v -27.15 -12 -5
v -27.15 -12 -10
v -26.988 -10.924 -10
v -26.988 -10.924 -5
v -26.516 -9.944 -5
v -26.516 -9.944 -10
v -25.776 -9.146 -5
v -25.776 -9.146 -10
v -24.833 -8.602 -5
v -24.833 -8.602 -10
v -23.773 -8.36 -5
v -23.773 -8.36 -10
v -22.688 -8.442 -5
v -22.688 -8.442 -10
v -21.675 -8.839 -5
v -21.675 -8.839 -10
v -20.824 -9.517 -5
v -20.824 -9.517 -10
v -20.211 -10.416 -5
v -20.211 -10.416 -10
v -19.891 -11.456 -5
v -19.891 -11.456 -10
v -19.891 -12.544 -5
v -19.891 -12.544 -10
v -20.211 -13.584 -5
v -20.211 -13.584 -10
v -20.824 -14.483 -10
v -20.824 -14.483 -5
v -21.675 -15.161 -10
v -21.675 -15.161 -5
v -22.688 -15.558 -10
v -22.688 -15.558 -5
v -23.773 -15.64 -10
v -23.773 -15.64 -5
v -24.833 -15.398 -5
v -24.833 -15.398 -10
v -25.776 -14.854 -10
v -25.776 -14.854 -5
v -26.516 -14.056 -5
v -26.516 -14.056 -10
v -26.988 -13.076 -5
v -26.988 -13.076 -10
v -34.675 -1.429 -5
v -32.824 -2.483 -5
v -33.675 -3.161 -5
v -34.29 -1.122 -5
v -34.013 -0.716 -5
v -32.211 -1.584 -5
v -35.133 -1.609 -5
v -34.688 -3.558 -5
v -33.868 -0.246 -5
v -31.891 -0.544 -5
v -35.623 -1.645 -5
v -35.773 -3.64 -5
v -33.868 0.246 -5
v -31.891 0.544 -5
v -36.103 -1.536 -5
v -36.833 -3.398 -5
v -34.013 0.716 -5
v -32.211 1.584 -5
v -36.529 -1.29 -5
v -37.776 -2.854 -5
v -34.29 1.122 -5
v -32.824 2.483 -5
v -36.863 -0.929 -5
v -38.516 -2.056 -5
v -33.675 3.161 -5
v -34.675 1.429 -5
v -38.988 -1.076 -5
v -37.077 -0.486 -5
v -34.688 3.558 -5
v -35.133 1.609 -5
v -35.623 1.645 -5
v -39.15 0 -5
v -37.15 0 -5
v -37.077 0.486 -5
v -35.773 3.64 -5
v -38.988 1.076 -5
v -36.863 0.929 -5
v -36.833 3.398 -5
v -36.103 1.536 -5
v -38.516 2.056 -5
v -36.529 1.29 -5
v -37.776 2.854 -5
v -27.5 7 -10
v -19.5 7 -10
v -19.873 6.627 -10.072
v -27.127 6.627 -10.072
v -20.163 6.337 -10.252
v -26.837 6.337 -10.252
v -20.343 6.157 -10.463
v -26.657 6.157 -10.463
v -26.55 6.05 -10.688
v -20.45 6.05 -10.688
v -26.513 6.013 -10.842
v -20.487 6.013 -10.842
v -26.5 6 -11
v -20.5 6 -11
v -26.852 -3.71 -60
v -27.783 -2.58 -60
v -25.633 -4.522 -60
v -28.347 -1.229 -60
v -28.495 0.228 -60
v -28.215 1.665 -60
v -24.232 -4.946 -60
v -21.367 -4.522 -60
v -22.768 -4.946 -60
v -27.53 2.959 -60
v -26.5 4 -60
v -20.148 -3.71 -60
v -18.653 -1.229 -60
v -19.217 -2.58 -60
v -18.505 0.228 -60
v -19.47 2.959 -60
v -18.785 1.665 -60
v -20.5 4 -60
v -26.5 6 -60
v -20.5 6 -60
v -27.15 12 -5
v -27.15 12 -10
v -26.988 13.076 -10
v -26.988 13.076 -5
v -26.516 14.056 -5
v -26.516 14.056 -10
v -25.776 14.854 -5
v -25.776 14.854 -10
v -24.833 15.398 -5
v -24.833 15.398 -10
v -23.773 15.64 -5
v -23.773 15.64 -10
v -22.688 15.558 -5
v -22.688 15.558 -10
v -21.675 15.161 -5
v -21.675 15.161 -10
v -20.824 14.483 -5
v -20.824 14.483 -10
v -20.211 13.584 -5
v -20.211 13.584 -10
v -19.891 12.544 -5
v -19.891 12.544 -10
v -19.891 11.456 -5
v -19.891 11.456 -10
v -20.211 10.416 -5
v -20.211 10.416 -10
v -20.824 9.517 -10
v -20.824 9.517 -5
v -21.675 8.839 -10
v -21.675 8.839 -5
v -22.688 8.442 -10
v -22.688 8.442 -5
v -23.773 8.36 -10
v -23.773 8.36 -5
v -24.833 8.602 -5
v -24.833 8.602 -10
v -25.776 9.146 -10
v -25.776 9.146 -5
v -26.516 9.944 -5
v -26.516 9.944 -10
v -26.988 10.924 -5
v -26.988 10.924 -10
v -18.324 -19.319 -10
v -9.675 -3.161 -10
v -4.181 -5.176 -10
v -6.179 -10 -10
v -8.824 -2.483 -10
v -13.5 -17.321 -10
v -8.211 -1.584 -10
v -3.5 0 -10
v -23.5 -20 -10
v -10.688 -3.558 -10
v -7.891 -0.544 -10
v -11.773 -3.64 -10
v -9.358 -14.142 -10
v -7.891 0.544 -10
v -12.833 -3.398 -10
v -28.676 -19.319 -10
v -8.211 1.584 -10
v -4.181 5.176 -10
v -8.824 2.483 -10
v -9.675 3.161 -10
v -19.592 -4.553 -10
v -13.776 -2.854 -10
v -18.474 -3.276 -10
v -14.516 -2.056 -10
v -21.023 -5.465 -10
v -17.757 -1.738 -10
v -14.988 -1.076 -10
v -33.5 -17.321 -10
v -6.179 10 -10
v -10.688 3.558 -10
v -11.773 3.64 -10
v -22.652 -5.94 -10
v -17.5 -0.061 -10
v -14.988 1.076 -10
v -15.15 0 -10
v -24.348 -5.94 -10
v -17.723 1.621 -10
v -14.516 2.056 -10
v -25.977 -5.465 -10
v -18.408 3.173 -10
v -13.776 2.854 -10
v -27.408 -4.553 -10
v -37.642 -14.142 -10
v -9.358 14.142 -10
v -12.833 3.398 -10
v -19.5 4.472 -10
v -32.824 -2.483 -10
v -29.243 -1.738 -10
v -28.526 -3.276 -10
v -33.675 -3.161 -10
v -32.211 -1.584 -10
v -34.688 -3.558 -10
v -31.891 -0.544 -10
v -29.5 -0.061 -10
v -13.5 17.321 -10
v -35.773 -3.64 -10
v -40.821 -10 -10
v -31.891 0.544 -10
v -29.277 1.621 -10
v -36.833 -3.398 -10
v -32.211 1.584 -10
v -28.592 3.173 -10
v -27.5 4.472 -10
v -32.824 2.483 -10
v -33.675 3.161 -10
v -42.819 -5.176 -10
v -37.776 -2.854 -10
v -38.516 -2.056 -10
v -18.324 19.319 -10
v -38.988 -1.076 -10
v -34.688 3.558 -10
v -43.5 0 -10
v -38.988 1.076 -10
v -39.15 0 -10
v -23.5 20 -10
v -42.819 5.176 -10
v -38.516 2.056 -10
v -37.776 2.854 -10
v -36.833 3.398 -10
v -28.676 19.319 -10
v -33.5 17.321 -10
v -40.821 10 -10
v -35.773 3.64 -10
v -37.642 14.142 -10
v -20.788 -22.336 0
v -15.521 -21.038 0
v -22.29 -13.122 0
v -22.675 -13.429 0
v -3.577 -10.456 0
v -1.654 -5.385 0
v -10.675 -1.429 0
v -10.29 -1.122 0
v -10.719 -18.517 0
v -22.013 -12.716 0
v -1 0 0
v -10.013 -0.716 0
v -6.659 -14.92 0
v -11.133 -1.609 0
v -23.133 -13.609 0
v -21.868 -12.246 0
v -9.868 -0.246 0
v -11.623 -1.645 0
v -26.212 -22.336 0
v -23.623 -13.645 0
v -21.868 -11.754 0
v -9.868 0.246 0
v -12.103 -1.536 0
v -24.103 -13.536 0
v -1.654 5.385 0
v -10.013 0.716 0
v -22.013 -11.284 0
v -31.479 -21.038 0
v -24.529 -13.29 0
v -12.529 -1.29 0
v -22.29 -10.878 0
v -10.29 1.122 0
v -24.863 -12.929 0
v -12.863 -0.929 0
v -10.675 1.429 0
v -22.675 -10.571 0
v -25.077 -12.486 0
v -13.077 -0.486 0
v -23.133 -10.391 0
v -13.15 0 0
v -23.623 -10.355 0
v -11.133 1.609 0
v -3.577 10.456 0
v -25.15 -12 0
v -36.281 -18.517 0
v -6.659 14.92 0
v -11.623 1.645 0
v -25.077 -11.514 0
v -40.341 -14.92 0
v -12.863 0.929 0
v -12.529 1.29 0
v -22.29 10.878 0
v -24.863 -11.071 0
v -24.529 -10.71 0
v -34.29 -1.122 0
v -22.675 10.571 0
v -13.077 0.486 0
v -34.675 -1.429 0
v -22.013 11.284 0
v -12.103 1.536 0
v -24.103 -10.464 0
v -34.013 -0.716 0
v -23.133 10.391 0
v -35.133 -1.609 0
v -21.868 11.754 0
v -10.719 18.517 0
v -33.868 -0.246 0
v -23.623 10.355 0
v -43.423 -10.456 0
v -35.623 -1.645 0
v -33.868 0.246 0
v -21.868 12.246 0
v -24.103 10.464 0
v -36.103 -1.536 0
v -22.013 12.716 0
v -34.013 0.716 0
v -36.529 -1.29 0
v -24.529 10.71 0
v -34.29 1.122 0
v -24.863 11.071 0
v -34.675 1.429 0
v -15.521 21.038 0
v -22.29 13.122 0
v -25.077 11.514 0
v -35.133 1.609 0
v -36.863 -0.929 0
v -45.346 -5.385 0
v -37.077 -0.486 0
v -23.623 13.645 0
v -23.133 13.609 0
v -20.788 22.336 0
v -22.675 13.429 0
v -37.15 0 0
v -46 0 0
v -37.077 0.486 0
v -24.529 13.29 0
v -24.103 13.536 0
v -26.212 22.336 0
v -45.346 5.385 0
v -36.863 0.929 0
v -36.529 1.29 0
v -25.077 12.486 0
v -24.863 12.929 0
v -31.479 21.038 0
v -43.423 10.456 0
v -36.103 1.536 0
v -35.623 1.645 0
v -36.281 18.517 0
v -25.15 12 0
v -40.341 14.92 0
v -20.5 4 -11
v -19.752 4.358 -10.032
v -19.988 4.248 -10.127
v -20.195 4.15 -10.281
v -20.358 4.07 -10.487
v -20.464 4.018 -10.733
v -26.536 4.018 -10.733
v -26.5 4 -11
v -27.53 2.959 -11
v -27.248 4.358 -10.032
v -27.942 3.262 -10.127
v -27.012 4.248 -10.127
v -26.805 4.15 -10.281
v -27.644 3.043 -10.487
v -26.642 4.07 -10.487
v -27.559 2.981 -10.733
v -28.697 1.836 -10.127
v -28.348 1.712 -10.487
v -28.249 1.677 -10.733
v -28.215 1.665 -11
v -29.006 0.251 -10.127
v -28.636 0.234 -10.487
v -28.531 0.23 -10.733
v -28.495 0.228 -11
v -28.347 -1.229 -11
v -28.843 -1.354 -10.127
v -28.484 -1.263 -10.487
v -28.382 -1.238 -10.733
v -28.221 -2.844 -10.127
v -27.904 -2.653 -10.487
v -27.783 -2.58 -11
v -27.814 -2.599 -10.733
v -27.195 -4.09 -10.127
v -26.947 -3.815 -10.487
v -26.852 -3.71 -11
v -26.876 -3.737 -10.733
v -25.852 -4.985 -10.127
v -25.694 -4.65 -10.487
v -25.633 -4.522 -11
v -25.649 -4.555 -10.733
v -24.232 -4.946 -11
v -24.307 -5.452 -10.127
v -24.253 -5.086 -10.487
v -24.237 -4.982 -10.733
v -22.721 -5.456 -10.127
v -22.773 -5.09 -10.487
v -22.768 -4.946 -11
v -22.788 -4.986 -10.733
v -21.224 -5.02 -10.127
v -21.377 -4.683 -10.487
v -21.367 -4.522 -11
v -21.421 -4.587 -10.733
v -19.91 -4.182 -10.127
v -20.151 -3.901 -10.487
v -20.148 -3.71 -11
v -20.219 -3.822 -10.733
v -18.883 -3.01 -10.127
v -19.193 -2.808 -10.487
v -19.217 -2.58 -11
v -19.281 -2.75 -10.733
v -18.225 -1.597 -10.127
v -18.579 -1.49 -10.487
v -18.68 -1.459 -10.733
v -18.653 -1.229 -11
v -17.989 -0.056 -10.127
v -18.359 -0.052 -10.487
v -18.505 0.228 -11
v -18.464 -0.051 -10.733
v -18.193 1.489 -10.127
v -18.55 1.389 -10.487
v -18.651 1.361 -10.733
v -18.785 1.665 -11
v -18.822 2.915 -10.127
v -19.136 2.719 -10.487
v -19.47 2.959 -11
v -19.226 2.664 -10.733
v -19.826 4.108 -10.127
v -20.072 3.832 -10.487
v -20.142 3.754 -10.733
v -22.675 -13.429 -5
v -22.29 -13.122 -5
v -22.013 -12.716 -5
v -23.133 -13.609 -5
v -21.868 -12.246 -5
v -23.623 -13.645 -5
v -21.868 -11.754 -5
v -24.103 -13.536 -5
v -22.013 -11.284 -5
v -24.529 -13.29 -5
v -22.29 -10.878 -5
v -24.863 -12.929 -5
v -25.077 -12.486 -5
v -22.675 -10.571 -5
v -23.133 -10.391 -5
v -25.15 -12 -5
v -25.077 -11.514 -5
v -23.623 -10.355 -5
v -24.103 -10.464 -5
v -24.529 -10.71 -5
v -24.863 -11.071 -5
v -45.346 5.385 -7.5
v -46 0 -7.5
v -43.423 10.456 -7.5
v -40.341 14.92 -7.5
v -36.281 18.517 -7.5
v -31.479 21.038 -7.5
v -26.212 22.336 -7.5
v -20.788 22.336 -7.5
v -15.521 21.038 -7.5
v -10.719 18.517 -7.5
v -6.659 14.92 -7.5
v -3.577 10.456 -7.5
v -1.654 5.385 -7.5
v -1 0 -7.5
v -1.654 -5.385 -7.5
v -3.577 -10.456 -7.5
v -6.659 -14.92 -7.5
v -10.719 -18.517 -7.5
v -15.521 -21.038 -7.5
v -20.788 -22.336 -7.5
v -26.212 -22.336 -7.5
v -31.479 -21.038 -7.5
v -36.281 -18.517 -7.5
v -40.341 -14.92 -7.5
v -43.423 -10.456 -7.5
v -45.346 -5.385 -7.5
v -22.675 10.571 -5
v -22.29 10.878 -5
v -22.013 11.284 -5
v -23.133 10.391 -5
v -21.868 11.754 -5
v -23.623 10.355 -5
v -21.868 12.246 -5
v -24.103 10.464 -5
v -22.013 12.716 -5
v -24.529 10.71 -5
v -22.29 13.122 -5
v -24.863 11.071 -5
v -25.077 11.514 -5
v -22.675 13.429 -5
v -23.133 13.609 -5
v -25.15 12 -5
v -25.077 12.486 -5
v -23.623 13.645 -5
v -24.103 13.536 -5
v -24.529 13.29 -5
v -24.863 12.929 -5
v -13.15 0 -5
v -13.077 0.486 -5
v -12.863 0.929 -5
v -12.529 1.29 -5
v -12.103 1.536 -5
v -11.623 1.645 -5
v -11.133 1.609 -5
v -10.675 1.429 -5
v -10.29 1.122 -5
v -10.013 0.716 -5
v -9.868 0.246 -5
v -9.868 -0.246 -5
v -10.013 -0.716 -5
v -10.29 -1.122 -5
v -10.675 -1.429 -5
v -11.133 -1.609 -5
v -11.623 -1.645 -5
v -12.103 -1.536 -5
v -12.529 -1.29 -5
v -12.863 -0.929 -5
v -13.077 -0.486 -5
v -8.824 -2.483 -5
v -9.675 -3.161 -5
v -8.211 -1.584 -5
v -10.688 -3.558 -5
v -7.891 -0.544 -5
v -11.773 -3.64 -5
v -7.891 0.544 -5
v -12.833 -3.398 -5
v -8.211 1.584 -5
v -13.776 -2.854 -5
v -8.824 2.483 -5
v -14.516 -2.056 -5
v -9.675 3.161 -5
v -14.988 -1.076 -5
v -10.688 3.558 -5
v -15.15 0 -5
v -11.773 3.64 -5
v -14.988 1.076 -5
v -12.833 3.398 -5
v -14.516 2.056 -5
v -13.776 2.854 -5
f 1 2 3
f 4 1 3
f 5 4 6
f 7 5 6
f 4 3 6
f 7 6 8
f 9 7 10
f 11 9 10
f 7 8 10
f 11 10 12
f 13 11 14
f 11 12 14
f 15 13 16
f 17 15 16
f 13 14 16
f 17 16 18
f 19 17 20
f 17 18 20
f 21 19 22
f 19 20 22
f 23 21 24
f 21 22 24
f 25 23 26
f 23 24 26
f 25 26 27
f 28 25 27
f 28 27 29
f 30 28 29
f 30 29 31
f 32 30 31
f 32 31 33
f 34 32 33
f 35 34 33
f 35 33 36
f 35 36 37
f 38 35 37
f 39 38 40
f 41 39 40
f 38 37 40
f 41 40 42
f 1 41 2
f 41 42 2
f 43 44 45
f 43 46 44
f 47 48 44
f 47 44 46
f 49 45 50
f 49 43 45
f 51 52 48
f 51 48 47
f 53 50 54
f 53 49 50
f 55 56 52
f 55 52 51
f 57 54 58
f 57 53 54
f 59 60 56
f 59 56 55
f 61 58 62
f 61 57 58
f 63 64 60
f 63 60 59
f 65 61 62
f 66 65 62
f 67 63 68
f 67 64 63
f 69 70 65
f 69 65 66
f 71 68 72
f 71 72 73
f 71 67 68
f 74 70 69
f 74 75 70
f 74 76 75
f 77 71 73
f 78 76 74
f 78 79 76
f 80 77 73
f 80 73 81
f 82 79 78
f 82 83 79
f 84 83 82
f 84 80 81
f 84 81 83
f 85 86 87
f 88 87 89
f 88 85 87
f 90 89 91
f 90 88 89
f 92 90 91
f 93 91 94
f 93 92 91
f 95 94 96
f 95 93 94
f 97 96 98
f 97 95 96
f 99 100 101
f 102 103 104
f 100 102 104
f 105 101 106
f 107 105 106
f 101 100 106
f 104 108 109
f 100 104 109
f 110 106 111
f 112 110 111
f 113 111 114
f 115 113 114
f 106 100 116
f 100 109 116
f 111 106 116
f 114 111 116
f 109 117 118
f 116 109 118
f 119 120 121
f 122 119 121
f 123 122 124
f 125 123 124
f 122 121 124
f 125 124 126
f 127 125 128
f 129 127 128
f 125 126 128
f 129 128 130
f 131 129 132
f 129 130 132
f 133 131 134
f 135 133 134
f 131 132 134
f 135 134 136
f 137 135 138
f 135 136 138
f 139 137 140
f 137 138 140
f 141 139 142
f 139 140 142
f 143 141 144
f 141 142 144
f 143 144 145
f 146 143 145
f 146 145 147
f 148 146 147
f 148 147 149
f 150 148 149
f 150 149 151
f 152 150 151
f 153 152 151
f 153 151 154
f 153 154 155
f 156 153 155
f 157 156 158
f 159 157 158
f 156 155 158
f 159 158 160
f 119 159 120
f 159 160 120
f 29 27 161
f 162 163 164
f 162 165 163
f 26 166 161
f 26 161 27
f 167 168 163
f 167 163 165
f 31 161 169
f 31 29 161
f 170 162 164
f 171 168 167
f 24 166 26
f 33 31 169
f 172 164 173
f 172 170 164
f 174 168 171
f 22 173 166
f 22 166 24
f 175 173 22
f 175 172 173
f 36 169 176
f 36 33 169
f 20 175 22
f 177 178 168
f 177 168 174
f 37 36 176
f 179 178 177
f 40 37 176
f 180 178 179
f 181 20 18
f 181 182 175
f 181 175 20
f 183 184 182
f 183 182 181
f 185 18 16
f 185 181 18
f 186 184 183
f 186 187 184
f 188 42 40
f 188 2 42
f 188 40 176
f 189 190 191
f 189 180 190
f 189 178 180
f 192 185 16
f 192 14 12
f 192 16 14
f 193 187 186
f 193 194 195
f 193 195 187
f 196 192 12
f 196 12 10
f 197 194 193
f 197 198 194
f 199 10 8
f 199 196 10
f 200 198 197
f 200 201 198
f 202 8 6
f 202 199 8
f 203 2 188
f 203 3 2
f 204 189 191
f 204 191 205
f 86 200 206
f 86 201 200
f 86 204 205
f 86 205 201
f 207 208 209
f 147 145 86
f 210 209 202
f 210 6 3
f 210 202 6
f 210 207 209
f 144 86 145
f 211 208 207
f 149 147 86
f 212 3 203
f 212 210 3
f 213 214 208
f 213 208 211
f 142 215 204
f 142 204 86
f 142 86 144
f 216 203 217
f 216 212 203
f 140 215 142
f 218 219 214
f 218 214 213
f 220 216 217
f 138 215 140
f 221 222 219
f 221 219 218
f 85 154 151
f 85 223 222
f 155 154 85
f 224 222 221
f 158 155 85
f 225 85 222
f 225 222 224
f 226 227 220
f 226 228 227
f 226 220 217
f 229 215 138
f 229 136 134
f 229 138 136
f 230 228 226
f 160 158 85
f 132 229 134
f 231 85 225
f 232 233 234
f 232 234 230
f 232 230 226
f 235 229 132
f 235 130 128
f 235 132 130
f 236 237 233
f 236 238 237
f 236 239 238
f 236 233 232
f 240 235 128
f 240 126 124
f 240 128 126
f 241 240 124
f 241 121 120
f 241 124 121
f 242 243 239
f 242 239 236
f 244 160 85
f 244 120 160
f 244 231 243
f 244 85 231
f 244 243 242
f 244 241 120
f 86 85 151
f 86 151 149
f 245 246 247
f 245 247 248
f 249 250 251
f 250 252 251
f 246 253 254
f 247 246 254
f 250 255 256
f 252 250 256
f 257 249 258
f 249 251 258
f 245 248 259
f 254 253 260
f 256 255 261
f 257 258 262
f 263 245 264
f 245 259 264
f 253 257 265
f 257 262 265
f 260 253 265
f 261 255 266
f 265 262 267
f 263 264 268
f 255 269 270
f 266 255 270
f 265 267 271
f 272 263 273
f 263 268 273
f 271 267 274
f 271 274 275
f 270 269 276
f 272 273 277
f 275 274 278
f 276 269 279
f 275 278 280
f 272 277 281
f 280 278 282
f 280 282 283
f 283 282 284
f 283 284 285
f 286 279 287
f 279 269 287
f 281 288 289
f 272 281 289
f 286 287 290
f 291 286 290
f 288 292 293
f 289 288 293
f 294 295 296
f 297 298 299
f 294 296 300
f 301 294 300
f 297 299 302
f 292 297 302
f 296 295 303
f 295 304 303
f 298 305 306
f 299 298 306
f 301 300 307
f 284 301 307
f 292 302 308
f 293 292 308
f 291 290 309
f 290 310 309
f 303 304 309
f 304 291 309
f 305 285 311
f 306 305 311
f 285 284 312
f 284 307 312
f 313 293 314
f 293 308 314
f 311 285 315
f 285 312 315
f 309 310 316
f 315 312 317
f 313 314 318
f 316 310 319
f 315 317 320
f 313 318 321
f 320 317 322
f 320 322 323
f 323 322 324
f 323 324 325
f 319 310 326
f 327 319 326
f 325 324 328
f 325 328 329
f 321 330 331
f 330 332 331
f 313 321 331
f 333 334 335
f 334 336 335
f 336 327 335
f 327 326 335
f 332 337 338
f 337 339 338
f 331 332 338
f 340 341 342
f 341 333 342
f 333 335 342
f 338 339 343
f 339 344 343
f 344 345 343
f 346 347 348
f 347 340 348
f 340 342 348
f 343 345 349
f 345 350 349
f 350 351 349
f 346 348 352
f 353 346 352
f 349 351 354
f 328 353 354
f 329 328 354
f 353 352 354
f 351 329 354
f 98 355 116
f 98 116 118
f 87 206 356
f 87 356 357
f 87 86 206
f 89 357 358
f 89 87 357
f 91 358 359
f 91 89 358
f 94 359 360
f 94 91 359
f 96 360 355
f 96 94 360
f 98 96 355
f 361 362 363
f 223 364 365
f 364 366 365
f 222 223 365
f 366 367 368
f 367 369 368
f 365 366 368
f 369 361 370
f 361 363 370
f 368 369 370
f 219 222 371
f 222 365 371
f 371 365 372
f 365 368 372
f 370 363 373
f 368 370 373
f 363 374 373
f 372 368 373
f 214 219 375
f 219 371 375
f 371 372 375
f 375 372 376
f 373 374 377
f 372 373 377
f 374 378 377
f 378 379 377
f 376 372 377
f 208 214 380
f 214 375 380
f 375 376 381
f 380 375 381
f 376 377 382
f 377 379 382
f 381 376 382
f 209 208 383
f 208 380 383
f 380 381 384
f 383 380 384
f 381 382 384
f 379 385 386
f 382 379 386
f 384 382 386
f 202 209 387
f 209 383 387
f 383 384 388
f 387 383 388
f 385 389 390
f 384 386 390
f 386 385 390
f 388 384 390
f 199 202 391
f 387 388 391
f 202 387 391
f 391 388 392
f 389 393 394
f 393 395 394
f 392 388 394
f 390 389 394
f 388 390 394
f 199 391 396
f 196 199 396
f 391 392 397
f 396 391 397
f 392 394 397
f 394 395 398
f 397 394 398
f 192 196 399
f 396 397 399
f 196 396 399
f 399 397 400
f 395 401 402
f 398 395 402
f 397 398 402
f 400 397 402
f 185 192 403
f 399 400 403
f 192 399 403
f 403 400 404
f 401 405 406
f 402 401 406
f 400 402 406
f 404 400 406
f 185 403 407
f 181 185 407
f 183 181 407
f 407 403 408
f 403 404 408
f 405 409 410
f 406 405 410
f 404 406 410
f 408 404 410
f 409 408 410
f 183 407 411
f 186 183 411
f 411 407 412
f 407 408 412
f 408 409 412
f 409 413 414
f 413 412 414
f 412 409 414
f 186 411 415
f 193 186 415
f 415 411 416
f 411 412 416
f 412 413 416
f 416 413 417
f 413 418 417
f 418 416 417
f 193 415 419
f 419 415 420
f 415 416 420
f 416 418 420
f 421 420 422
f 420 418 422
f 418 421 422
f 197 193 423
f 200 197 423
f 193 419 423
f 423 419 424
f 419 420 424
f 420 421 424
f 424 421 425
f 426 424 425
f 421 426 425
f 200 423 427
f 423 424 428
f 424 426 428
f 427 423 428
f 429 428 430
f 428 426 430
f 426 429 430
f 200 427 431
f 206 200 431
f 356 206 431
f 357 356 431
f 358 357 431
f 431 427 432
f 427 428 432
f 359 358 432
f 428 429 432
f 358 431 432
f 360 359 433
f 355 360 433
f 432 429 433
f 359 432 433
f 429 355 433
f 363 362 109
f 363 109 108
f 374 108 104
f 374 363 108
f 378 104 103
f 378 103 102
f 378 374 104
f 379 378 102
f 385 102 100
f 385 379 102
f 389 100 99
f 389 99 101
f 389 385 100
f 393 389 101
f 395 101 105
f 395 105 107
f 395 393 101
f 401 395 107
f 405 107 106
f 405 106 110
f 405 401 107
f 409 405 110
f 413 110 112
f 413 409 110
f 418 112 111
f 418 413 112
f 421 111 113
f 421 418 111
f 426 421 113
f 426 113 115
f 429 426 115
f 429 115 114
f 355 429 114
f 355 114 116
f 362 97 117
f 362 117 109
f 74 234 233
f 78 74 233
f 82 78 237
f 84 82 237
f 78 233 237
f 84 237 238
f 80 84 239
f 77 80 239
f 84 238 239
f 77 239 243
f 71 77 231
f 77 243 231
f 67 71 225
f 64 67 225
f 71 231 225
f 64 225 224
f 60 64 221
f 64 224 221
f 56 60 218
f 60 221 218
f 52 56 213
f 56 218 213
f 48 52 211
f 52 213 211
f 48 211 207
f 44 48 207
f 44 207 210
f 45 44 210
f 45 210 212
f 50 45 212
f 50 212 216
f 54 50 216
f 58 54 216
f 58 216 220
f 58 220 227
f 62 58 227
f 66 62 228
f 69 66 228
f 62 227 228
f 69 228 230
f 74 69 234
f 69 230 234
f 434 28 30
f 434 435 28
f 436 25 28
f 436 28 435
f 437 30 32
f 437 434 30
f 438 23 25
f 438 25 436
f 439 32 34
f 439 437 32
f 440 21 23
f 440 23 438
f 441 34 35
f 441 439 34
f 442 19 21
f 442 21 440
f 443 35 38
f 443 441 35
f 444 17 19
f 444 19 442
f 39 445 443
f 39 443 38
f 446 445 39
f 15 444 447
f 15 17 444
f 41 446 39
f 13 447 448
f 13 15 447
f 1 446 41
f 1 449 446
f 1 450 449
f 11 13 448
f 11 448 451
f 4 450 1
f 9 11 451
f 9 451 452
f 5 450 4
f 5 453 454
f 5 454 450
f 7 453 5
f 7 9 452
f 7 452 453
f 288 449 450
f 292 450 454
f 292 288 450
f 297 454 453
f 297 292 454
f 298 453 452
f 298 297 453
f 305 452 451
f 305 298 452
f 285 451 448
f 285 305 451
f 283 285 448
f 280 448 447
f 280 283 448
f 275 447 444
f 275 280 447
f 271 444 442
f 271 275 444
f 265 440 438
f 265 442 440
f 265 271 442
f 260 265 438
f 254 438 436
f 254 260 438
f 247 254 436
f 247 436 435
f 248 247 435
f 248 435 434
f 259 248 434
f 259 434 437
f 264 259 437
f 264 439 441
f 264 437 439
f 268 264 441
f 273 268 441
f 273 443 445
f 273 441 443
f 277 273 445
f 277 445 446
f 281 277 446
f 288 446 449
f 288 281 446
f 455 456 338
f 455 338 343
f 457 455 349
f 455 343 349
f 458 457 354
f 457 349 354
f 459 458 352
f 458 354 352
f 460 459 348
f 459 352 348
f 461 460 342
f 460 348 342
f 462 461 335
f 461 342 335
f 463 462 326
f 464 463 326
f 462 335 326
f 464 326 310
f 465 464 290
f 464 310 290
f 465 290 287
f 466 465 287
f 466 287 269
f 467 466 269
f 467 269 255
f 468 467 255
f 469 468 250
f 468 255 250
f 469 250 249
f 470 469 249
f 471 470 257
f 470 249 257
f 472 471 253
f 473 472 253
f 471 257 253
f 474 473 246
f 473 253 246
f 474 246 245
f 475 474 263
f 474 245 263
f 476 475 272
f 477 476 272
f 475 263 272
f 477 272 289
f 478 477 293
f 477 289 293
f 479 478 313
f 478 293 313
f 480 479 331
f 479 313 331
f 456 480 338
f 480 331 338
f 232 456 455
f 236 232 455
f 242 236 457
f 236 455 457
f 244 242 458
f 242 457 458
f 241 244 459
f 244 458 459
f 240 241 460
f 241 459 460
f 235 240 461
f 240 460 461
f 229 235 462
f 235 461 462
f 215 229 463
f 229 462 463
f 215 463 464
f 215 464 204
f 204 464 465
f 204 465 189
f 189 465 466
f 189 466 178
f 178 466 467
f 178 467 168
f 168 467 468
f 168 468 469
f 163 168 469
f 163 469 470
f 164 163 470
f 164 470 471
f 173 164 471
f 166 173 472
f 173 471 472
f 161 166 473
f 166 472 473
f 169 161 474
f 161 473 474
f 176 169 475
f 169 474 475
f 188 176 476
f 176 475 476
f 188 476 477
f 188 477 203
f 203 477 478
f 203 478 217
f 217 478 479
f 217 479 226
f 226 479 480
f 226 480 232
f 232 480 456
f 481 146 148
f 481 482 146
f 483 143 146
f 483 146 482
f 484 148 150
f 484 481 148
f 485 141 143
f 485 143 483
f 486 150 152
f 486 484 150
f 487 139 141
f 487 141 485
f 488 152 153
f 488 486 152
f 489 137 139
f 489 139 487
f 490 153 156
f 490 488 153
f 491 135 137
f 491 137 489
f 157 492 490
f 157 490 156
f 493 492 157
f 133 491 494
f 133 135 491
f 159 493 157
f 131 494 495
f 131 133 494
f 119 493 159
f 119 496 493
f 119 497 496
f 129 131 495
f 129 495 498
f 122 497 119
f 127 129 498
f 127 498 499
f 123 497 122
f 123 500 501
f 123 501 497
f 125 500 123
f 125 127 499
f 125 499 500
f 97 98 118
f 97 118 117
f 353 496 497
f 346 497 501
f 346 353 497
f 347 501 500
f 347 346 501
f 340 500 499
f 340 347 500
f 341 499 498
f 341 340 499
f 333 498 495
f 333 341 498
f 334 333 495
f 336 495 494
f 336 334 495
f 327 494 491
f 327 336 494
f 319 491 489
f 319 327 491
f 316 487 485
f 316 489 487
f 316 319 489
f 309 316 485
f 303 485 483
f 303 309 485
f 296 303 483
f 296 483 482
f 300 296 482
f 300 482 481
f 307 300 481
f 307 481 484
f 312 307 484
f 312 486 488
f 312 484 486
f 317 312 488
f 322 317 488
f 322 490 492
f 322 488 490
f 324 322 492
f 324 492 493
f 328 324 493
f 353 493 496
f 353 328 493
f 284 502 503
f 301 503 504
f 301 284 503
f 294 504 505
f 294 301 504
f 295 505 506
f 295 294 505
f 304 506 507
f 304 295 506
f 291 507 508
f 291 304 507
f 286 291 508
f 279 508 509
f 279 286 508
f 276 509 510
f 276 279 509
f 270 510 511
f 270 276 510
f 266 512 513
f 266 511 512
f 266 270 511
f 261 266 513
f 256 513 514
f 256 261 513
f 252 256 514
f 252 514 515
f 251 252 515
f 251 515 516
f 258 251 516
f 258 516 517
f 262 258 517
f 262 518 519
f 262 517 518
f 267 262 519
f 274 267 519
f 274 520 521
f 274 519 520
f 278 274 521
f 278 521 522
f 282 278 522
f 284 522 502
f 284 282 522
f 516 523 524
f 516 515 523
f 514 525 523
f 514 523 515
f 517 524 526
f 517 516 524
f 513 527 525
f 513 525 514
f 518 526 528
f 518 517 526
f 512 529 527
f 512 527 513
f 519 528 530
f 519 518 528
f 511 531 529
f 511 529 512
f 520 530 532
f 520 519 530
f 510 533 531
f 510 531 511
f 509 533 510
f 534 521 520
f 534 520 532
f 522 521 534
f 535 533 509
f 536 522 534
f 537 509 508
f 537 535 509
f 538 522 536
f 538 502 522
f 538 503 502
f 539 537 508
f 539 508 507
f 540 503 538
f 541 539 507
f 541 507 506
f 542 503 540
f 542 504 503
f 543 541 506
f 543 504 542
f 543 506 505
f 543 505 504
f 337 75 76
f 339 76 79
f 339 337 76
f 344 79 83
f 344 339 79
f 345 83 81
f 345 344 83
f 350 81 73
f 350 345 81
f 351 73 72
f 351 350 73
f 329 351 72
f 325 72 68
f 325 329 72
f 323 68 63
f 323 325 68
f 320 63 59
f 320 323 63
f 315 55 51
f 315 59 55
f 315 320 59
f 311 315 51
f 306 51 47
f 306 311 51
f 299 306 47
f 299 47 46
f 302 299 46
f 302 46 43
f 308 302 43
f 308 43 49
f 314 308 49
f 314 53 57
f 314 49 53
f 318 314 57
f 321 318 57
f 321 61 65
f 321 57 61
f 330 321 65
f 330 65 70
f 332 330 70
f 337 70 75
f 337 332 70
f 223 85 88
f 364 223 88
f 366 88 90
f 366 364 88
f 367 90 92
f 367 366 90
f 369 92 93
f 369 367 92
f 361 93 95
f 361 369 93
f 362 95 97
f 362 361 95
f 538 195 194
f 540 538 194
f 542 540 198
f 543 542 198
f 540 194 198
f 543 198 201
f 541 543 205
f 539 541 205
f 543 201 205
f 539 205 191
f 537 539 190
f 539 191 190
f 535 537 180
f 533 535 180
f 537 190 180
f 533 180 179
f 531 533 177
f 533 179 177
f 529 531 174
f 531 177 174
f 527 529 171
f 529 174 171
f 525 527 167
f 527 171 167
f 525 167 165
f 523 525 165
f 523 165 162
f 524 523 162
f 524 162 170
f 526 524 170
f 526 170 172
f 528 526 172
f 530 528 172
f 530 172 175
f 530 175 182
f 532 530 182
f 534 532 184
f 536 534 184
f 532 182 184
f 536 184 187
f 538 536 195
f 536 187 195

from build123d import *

# Parameters (mm, degrees)
SKETCH8_R           = 22.5
SKETCH8_R_2         = 1.65
BOSS_EXTRUDE5_DEPTH = 10
SKETCH9_R           = 3.65
CUT_EXTRUDE1_DEPTH  = 5
BOSS_EXTRUDE6_DEPTH = 50
FILLET1_R           = 1
CHAMFER1_SIZE       = 2.5


with BuildPart() as part:
    # Sketch8 → Boss-Extrude5 (new body)
    with BuildSketch(Plane(origin=(-41, 0, 0), x_dir=(-1, 0, 0), z_dir=(0, 0, -1))):
        with Locations((-17.5, 0)):
            Circle(SKETCH8_R)
        with Locations((-17.5, 12)):
            Circle(SKETCH8_R_2, mode=Mode.SUBTRACT)
        with Locations((-5.5, 0)):
            Circle(SKETCH8_R_2, mode=Mode.SUBTRACT)
        with Locations((-17.5, -12)):
            Circle(SKETCH8_R_2, mode=Mode.SUBTRACT)
        with Locations((-29.5, 0)):
            Circle(SKETCH8_R_2, mode=Mode.SUBTRACT)
    extrude(amount=BOSS_EXTRUDE5_DEPTH)

    # Sketch9 → Cut-Extrude1 (cut, symmetric)
    with BuildSketch(Plane(origin=(0, 0, -10), x_dir=(-1, 0, 0), z_dir=(0, 0, -1))):
        with Locations((23.5, 12)):
            Circle(SKETCH9_R)
        with Locations((11.5, 0)):
            Circle(SKETCH9_R)
        with Locations((35.5, 0)):
            Circle(SKETCH9_R)
        with Locations((23.5, -12)):
            Circle(SKETCH9_R)
    extrude(amount=CUT_EXTRUDE1_DEPTH, both=True, mode=Mode.SUBTRACT)

    # Sketch10 → Boss-Extrude6 (add)
    with BuildSketch(Plane(origin=(0, 0, -10), x_dir=(-1, 0, 0), z_dir=(0, 0, -1))):
        with BuildLine():
            Line((20.5, 6), (26.5, 6))
            Line((26.5, 6), (26.5, 4))
            ThreePointArc((26.5, 4), (23.5, -5), (20.5, 4))
            Line((20.5, 4), (20.5, 6))
        make_face()
    extrude(amount=BOSS_EXTRUDE6_DEPTH)

    # Fillet1
    fillet1_edges = [part.edges().sort_by_distance(p)[0] for p in [
        (-23.5, -5, -10),
        (-26.5, 5, -10),
        (-23.5, 6, -10),
        (-20.5, 5, -10),
    ]]
    fillet(fillet1_edges, radius=FILLET1_R)

    # Chamfer1
    chamfer1_edges = [part.edges().sort_by_distance(p)[0] for p in [
        (-1, 0, -10),
    ]]
    chamfer(chamfer1_edges, length=CHAMFER1_SIZE)


solid = part.part
